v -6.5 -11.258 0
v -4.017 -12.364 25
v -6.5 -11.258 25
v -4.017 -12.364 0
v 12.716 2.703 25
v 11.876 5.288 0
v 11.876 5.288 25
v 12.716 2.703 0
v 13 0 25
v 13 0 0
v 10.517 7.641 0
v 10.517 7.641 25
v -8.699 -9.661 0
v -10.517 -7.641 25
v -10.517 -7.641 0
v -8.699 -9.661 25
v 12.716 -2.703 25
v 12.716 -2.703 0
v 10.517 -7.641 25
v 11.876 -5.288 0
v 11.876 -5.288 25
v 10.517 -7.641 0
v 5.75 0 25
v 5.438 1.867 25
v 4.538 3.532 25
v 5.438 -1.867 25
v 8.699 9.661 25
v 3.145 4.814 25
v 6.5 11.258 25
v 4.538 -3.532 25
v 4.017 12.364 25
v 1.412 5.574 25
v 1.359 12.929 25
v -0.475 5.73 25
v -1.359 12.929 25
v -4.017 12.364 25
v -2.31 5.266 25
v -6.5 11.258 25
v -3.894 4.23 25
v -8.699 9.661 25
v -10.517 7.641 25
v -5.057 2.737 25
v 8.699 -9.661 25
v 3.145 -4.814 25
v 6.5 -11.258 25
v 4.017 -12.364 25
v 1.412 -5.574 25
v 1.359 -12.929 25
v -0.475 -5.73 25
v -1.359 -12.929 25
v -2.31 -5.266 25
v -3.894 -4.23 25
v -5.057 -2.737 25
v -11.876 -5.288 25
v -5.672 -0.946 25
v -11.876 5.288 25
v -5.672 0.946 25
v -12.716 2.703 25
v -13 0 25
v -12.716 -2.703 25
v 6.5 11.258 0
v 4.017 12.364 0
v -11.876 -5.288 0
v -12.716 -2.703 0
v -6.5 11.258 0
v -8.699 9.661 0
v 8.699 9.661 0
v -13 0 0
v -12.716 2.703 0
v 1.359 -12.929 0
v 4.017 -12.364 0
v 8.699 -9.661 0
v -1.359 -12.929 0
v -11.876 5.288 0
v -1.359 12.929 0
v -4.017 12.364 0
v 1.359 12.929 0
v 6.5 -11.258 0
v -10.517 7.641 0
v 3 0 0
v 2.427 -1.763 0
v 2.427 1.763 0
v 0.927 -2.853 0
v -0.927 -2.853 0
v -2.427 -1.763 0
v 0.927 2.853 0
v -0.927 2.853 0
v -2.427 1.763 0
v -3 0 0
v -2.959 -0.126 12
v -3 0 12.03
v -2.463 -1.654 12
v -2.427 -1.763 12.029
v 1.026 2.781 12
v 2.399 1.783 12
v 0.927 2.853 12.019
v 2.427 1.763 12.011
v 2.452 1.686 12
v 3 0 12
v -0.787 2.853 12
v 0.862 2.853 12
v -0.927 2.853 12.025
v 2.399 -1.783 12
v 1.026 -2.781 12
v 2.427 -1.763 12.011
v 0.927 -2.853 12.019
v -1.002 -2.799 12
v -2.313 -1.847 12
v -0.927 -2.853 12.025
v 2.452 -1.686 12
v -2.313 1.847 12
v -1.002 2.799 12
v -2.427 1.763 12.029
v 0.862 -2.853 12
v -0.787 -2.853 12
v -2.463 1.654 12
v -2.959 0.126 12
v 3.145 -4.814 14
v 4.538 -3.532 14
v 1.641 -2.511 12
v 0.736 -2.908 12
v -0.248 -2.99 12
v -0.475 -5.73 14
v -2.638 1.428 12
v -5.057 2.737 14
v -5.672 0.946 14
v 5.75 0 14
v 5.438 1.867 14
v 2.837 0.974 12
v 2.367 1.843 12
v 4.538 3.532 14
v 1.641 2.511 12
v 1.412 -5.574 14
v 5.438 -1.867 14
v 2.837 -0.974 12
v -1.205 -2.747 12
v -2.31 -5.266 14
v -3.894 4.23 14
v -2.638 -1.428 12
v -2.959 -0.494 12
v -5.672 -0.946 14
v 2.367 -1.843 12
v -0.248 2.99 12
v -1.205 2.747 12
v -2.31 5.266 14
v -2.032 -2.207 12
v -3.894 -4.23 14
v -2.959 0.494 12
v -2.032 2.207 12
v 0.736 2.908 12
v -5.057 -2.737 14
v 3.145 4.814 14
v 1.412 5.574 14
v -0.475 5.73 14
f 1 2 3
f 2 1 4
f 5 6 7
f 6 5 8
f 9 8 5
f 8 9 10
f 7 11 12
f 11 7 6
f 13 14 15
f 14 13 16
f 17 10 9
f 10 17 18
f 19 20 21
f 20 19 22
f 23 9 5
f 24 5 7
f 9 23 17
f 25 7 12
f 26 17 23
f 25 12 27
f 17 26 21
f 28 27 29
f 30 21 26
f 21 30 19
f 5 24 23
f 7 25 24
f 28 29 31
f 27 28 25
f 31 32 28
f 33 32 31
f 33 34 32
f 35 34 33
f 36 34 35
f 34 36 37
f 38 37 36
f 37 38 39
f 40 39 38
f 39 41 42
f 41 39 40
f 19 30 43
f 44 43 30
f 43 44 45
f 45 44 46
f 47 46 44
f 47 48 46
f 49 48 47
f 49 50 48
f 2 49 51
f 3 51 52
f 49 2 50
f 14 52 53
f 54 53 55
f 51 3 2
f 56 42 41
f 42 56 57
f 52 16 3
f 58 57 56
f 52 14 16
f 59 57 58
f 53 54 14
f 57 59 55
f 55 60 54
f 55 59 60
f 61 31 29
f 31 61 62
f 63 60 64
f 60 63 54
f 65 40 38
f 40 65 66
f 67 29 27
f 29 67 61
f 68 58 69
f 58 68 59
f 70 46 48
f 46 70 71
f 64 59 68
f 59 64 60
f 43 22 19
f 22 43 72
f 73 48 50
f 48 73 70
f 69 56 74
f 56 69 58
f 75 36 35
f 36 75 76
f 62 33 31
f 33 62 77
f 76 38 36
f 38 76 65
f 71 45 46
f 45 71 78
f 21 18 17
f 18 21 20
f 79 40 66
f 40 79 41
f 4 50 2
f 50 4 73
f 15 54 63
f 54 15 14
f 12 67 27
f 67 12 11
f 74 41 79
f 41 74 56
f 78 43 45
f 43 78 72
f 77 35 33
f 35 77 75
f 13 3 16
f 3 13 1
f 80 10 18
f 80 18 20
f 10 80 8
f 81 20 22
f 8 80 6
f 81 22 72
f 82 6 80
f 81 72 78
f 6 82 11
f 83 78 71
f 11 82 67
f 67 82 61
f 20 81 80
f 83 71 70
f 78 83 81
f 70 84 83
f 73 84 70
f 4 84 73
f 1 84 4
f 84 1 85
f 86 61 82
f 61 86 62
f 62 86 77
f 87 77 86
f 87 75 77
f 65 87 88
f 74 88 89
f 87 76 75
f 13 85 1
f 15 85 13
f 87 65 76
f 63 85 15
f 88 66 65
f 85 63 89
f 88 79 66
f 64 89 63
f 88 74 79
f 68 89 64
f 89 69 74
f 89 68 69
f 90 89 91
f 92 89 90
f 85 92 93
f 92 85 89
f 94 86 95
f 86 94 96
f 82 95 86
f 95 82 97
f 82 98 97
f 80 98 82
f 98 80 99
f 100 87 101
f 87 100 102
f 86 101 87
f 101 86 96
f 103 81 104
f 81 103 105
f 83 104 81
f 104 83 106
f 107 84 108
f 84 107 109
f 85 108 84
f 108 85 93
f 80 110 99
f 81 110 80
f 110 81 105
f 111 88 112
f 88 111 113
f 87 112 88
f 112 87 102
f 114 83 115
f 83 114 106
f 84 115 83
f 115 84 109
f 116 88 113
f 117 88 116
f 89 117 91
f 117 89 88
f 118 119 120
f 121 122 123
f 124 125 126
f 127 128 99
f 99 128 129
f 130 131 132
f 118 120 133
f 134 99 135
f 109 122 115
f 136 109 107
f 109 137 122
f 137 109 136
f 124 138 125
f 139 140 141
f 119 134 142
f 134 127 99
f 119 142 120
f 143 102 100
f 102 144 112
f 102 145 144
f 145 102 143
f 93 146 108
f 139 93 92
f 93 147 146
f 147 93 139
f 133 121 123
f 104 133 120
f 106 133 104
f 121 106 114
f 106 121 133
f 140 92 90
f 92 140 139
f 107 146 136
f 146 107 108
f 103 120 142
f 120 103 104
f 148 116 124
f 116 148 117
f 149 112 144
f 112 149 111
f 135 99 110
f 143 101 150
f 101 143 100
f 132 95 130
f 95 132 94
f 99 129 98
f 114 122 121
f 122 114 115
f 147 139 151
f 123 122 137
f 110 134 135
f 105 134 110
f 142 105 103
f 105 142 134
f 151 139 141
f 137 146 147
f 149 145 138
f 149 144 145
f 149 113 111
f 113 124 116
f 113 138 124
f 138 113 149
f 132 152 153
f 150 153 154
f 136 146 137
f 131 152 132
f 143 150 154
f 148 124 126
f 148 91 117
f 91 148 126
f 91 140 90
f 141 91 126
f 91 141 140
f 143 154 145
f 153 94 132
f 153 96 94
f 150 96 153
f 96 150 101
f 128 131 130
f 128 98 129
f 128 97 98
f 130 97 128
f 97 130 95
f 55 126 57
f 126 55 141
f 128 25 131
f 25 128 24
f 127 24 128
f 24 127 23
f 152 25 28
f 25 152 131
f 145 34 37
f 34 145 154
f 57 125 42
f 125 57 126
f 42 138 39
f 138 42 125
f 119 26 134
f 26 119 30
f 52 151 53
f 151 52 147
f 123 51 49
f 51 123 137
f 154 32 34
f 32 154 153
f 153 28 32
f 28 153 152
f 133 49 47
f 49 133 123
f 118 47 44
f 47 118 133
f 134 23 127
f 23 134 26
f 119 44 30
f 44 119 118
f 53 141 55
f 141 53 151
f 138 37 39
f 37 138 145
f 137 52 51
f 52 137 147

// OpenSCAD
difference() {
	cylinder(h = 25, d = 26);
    cylinder(h = 27, d1 = 6, d2 = 6);
	translate([0, 0, 13]) {
        cylinder(h = 2, d1 = 6, d2 = 11.5, center = true);
    }
    translate([0,0,26]) {
        cylinder(h = 24, d1 = 11.5, d2 = 11.5, center = true);
    }
}

//translate([0, 0, 10]) { 
//		cylinder(h = 2, d1 = 6, d2 = 7.5);
//}


//difference() {
//    cylinder(h = 16, d = 26, center = true);
//    cylinder(h = 26, d = 6, center = true);
//}
